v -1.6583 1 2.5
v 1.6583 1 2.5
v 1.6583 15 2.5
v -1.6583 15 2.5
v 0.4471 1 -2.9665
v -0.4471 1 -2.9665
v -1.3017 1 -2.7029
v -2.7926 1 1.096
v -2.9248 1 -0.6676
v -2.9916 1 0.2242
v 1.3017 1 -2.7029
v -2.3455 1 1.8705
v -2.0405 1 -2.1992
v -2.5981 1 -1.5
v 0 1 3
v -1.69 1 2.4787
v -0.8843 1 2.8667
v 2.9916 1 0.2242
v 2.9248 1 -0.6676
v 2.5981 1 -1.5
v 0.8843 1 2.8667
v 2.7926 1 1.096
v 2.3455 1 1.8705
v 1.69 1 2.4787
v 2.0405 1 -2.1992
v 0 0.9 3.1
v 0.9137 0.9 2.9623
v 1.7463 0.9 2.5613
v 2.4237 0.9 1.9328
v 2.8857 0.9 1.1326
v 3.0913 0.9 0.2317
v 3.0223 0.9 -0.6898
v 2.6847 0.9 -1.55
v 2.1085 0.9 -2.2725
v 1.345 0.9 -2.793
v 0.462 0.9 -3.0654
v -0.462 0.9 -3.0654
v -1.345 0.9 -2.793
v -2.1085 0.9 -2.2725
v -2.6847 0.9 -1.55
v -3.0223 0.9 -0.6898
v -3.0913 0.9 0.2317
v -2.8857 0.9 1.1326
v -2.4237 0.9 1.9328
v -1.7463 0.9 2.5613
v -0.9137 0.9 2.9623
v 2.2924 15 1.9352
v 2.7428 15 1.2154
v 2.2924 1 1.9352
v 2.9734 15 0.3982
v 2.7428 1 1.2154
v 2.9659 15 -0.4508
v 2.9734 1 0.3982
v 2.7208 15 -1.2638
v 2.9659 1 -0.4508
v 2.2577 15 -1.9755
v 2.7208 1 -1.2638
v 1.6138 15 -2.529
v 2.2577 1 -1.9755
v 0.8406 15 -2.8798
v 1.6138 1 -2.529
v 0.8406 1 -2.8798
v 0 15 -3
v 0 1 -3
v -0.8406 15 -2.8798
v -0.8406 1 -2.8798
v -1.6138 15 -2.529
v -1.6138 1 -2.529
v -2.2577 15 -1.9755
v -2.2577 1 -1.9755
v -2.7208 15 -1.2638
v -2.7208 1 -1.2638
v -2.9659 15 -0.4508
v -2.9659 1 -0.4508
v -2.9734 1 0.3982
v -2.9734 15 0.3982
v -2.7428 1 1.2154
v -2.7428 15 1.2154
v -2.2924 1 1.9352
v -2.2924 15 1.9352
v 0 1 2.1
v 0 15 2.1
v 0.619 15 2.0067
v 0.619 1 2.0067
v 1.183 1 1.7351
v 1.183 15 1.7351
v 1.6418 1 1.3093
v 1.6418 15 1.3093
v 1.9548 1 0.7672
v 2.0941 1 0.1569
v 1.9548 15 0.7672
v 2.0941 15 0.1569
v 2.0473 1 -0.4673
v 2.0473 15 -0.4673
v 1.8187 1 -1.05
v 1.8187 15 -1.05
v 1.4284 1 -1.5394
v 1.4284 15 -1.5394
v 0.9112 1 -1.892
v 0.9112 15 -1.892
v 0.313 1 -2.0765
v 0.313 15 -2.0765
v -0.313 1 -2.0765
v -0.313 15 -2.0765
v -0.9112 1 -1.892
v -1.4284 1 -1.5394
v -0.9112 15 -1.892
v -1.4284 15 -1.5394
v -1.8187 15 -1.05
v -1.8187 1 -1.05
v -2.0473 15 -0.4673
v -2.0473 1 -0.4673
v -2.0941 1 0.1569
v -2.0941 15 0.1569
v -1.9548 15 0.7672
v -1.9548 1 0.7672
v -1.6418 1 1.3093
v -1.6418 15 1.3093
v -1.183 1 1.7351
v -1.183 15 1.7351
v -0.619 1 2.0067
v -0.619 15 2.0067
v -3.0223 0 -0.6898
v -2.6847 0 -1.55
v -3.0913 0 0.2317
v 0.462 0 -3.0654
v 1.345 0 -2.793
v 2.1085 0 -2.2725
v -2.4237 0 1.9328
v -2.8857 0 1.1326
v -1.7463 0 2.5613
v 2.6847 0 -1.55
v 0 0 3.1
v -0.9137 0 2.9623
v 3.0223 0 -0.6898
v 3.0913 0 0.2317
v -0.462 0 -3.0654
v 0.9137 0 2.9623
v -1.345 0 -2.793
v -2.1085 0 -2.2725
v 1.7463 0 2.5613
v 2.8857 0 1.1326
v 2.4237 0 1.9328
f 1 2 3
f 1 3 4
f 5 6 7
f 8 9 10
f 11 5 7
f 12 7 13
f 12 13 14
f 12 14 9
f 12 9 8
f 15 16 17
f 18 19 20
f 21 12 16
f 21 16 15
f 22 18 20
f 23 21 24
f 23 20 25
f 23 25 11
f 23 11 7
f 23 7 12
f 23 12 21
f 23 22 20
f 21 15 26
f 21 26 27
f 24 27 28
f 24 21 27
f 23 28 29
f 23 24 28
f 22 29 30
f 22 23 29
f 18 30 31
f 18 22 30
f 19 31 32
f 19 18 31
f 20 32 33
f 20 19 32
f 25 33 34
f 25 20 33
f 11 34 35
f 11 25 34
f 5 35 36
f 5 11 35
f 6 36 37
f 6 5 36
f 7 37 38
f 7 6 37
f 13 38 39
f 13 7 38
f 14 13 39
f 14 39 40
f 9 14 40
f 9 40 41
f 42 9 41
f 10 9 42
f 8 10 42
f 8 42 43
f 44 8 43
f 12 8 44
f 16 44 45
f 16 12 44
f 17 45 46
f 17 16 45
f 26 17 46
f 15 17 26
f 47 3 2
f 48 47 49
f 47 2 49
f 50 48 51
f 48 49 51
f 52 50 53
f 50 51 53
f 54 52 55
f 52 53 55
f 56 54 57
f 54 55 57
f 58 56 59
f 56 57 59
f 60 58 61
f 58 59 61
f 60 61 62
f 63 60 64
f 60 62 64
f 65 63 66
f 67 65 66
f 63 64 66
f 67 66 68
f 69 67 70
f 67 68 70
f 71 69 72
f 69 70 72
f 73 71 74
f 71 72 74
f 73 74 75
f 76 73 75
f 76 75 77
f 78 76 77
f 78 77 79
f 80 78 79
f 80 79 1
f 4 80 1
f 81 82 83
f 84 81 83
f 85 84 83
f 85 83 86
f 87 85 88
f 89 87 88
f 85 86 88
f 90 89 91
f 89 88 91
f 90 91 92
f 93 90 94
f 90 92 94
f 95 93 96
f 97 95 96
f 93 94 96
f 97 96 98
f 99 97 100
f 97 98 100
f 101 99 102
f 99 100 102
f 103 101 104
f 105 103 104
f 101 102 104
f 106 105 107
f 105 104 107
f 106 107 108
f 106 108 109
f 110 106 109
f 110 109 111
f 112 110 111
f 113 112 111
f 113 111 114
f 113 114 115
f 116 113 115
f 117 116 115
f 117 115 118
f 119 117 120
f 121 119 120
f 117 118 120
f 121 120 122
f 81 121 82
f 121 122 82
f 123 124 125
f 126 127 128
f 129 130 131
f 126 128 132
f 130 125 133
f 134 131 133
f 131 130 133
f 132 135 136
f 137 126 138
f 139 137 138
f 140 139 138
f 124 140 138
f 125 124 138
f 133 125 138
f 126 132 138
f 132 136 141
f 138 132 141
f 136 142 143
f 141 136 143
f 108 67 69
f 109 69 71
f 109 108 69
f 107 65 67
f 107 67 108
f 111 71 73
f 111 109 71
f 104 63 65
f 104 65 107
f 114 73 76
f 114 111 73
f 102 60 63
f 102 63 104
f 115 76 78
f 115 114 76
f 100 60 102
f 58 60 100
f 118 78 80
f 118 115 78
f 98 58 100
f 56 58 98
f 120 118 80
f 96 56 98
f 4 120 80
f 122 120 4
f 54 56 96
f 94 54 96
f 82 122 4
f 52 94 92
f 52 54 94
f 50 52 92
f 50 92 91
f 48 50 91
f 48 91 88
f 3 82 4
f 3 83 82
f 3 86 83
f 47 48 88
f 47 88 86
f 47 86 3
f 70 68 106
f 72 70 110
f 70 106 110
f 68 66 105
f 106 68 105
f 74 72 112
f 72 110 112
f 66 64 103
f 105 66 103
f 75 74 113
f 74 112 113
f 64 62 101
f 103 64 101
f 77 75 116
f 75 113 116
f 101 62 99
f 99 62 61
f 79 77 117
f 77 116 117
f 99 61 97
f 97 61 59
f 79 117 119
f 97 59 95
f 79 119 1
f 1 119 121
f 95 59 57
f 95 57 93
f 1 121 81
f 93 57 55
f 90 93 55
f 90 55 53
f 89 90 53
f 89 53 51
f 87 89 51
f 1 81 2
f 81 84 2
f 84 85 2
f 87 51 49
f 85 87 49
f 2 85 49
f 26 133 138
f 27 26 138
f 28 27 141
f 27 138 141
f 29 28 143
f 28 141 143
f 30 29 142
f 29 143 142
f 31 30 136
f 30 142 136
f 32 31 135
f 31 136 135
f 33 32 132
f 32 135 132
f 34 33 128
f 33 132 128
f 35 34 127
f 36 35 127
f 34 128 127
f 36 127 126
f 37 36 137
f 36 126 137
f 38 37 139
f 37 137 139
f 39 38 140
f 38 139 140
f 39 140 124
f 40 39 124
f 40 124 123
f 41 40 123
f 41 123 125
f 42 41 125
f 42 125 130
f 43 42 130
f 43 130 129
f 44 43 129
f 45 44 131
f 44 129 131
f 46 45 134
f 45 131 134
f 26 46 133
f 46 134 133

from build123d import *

# Parameters (mm, degrees)
CROQUIS1_R                 = 3.1
SALIENTE_EXTRUIR1_DEPTH    = 1
CROQUIS2_R                 = 3
SALIENTE_EXTRUIR2_DEPTH    = 14
CHAFL_N3_SIZE              = 0.1
CORTAR_EXTRUIR1_DEPTH      = 16.627539794
CORTAR_EXTRUIR1_DEPTH_BACK = 14
CROQUIS6_R                 = 2.1
CORTAR_EXTRUIR2_DEPTH      = 14


with BuildPart() as part:
    # Croquis1 → Saliente-Extruir1 (new body)
    with BuildSketch(Plane(origin=(0, 0, 0), x_dir=(1, 0, 0), z_dir=(0, 1, 0))):
        with Locations(Location((0, 0, 0), (0, 0, 270))):
            Circle(CROQUIS1_R)
    extrude(amount=SALIENTE_EXTRUIR1_DEPTH)

    # Chaflán3
    chafl_n3_edges = [part.edges().sort_by_distance(p)[0] for p in [
        (0, 1, -3.1),
    ]]
    chamfer(chafl_n3_edges, length=CHAFL_N3_SIZE)


with BuildPart() as body_2:
    # Croquis2 → Saliente-Extruir2 (new body)
    with BuildSketch(Plane(origin=(0, 1, 0), x_dir=(1, 0, 0), z_dir=(0, 1, 0))):
        with Locations(Location((0, 0, 0), (0, 0, 270))):
            Circle(CROQUIS2_R)
    extrude(amount=SALIENTE_EXTRUIR2_DEPTH)

    # Croquis5 → Cortar-Extruir1 (cut, two sides: drawn at the far end of the back side and taken through both)
    with BuildSketch(Plane(origin=(0, 15, 0), x_dir=(1, 0, 0), z_dir=(0, 1, 0)).offset(-CORTAR_EXTRUIR1_DEPTH_BACK)):
        with BuildLine():
            Line((1.658312395, -2.5), (-1.658312395, -2.5))
            ThreePointArc((-1.658312395, -2.5), (0, -3), (1.658312395, -2.5))
        make_face()
    extrude(amount=CORTAR_EXTRUIR1_DEPTH + CORTAR_EXTRUIR1_DEPTH_BACK, mode=Mode.SUBTRACT)

    # Croquis6 → Cortar-Extruir2 (cut)
    with BuildSketch(Plane(origin=(0, 15, 0), x_dir=(1, 0, 0), z_dir=(0, 1, 0))):
        with Locations(Location((0, 0, 0), (0, 0, 270))):
            Circle(CROQUIS6_R)
    extrude(amount=-CORTAR_EXTRUIR2_DEPTH, mode=Mode.SUBTRACT)


solid = Compound([part.part, body_2.part])
